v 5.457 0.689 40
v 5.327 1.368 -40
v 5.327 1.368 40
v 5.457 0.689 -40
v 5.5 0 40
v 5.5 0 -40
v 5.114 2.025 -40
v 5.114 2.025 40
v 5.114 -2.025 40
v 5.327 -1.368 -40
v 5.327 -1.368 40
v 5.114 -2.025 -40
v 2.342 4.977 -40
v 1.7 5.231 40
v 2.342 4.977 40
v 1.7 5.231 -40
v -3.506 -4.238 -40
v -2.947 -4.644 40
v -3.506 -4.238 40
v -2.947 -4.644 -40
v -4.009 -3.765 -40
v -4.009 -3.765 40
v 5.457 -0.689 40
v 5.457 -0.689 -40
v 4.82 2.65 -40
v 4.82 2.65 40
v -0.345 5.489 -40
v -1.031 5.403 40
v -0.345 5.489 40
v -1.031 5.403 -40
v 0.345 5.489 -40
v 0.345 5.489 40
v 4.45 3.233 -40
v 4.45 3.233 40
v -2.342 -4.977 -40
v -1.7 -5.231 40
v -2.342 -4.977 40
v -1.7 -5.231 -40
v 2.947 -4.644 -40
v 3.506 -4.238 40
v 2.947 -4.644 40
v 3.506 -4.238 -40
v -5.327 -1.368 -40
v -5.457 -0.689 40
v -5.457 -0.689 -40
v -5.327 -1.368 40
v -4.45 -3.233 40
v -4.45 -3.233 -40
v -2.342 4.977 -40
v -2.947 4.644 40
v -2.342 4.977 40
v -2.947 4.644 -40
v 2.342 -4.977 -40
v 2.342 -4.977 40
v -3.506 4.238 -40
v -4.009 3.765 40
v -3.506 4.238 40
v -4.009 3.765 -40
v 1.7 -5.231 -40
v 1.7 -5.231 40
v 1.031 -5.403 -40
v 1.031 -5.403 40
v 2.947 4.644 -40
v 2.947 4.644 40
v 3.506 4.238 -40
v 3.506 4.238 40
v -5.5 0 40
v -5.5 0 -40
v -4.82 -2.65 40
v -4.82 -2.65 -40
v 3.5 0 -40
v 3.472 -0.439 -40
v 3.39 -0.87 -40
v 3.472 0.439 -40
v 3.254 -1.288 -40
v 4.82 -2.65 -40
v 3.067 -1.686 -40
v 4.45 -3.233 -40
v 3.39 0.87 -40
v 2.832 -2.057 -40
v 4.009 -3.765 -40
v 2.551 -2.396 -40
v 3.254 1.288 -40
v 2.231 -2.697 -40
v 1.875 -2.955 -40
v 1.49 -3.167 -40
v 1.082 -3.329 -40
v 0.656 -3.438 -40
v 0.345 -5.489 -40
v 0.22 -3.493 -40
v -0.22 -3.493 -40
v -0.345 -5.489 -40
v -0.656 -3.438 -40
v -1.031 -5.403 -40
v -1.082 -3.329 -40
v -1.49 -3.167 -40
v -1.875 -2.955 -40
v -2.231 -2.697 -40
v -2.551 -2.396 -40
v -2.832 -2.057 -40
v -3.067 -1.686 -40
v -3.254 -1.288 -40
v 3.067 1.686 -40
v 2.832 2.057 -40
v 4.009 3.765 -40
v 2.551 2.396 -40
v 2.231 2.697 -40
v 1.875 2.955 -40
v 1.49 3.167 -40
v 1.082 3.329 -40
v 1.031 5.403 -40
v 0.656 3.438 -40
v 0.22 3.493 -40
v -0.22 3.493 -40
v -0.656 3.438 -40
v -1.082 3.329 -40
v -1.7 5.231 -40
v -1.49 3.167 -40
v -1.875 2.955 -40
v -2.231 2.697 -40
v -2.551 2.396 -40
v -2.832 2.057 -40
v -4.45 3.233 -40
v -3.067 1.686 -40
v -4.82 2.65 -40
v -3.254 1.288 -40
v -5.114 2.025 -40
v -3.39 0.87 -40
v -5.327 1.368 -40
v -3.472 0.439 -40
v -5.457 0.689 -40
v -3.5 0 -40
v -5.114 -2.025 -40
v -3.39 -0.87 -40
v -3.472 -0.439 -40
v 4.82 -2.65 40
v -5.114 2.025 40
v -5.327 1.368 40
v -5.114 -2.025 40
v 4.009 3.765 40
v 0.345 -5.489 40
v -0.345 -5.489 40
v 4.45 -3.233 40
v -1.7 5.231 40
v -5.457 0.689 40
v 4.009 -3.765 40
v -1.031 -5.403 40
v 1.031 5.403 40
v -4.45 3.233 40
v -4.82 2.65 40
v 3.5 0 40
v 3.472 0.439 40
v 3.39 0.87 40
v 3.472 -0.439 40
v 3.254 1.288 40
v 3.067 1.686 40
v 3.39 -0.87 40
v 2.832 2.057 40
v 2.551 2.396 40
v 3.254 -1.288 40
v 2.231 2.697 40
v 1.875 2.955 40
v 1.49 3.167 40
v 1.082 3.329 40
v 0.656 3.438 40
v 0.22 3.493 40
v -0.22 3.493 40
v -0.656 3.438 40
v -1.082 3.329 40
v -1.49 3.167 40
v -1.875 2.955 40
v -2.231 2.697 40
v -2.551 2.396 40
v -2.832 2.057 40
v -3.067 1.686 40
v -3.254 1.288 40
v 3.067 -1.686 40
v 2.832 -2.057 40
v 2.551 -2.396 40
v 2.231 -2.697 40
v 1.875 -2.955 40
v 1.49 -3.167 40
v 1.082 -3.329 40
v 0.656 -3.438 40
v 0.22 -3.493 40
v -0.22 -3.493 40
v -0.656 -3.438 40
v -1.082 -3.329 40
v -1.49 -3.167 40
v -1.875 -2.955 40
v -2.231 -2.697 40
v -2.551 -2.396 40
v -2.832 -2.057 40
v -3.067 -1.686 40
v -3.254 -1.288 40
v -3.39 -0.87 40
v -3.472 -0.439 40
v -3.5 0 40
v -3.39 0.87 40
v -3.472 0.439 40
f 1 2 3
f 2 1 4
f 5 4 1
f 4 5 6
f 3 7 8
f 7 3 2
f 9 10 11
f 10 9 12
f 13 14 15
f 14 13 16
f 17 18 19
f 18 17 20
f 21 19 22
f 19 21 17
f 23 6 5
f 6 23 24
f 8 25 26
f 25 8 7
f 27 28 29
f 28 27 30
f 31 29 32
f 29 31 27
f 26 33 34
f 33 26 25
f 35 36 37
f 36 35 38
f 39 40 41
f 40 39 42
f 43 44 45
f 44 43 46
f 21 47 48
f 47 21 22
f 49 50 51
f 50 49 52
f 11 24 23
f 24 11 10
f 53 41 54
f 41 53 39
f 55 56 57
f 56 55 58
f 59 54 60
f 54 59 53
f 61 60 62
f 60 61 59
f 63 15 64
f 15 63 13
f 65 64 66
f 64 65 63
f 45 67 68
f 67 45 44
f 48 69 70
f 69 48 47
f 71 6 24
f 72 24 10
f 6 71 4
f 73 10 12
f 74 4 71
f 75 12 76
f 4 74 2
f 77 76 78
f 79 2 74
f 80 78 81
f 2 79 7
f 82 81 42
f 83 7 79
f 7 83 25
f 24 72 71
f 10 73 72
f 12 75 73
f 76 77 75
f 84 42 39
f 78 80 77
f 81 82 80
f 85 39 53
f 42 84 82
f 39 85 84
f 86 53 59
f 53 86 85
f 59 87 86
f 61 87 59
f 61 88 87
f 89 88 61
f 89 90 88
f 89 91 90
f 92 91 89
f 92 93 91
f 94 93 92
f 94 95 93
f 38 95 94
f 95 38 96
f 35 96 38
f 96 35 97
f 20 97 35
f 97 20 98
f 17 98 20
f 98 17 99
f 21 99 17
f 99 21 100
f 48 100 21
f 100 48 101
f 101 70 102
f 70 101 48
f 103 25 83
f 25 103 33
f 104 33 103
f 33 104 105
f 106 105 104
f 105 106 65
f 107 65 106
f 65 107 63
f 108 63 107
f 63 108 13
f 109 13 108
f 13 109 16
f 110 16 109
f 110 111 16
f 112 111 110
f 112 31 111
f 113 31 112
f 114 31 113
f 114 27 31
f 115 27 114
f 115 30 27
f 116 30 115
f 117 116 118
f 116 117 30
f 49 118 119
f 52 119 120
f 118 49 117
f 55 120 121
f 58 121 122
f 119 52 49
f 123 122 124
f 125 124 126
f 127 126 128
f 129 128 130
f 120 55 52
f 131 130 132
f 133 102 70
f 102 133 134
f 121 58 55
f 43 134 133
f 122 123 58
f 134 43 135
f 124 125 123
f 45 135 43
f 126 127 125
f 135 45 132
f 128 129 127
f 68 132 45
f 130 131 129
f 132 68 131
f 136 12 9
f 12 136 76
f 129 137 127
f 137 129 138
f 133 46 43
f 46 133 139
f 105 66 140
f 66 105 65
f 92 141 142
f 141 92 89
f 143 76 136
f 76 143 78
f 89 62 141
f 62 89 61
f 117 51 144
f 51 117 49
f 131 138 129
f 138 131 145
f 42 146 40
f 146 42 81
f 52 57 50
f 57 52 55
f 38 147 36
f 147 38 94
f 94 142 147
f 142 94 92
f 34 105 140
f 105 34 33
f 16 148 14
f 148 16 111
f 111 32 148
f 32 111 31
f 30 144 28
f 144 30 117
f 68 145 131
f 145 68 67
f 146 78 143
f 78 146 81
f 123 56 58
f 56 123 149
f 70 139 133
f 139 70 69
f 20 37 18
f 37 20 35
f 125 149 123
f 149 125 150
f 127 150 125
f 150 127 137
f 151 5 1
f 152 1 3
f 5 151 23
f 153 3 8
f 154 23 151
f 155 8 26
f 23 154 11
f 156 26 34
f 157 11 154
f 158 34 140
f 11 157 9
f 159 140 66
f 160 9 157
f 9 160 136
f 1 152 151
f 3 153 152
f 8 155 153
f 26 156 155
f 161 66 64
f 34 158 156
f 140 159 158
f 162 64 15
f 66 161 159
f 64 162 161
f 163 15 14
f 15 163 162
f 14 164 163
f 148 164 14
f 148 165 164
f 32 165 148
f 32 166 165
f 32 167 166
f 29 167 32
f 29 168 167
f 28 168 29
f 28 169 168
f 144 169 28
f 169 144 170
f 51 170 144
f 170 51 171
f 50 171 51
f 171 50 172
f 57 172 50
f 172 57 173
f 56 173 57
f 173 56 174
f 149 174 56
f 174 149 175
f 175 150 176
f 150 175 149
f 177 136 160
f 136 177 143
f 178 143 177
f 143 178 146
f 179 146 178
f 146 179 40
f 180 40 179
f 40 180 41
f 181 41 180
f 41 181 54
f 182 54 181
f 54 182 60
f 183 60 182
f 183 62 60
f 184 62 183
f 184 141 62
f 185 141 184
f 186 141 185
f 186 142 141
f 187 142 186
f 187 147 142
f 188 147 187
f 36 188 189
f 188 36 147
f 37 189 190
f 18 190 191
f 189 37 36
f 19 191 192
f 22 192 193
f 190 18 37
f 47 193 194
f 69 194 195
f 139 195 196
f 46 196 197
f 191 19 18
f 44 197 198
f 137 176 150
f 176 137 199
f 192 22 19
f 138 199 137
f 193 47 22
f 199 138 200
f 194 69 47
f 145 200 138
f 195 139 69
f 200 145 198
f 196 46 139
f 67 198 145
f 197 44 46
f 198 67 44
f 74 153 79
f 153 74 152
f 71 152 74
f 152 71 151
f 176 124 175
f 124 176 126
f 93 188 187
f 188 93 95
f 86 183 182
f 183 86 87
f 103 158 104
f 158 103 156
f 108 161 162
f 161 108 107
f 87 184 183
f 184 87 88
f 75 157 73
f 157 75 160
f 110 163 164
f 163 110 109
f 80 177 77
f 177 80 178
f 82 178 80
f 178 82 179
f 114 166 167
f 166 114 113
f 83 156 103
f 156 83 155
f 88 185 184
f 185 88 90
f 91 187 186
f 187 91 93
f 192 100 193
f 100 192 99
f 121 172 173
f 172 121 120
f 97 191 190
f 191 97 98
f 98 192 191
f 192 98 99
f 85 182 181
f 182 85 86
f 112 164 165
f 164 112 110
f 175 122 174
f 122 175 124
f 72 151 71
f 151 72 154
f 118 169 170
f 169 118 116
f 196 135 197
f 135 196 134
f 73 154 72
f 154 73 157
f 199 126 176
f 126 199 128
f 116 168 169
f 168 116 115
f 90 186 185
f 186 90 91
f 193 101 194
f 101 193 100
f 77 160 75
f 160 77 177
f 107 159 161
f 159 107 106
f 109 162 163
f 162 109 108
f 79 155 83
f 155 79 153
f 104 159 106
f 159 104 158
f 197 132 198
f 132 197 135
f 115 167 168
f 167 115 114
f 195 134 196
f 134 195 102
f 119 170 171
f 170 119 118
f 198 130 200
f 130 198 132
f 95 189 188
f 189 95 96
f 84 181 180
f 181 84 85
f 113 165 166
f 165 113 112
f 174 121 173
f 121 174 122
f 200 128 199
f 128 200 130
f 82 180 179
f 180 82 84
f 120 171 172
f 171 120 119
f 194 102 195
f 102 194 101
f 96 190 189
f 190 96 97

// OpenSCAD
$fn = 50;


difference() {
	union() {
		translate(v = [0, 0, -40.0000000000]) {
			cylinder(h = 80, r = 5.5000000000);
		}
	}
	union() {
		translate(v = [0, 0, -100.0000000000]) {
			cylinder(h = 200, r = 3.5000000000);
		}
	}
}
